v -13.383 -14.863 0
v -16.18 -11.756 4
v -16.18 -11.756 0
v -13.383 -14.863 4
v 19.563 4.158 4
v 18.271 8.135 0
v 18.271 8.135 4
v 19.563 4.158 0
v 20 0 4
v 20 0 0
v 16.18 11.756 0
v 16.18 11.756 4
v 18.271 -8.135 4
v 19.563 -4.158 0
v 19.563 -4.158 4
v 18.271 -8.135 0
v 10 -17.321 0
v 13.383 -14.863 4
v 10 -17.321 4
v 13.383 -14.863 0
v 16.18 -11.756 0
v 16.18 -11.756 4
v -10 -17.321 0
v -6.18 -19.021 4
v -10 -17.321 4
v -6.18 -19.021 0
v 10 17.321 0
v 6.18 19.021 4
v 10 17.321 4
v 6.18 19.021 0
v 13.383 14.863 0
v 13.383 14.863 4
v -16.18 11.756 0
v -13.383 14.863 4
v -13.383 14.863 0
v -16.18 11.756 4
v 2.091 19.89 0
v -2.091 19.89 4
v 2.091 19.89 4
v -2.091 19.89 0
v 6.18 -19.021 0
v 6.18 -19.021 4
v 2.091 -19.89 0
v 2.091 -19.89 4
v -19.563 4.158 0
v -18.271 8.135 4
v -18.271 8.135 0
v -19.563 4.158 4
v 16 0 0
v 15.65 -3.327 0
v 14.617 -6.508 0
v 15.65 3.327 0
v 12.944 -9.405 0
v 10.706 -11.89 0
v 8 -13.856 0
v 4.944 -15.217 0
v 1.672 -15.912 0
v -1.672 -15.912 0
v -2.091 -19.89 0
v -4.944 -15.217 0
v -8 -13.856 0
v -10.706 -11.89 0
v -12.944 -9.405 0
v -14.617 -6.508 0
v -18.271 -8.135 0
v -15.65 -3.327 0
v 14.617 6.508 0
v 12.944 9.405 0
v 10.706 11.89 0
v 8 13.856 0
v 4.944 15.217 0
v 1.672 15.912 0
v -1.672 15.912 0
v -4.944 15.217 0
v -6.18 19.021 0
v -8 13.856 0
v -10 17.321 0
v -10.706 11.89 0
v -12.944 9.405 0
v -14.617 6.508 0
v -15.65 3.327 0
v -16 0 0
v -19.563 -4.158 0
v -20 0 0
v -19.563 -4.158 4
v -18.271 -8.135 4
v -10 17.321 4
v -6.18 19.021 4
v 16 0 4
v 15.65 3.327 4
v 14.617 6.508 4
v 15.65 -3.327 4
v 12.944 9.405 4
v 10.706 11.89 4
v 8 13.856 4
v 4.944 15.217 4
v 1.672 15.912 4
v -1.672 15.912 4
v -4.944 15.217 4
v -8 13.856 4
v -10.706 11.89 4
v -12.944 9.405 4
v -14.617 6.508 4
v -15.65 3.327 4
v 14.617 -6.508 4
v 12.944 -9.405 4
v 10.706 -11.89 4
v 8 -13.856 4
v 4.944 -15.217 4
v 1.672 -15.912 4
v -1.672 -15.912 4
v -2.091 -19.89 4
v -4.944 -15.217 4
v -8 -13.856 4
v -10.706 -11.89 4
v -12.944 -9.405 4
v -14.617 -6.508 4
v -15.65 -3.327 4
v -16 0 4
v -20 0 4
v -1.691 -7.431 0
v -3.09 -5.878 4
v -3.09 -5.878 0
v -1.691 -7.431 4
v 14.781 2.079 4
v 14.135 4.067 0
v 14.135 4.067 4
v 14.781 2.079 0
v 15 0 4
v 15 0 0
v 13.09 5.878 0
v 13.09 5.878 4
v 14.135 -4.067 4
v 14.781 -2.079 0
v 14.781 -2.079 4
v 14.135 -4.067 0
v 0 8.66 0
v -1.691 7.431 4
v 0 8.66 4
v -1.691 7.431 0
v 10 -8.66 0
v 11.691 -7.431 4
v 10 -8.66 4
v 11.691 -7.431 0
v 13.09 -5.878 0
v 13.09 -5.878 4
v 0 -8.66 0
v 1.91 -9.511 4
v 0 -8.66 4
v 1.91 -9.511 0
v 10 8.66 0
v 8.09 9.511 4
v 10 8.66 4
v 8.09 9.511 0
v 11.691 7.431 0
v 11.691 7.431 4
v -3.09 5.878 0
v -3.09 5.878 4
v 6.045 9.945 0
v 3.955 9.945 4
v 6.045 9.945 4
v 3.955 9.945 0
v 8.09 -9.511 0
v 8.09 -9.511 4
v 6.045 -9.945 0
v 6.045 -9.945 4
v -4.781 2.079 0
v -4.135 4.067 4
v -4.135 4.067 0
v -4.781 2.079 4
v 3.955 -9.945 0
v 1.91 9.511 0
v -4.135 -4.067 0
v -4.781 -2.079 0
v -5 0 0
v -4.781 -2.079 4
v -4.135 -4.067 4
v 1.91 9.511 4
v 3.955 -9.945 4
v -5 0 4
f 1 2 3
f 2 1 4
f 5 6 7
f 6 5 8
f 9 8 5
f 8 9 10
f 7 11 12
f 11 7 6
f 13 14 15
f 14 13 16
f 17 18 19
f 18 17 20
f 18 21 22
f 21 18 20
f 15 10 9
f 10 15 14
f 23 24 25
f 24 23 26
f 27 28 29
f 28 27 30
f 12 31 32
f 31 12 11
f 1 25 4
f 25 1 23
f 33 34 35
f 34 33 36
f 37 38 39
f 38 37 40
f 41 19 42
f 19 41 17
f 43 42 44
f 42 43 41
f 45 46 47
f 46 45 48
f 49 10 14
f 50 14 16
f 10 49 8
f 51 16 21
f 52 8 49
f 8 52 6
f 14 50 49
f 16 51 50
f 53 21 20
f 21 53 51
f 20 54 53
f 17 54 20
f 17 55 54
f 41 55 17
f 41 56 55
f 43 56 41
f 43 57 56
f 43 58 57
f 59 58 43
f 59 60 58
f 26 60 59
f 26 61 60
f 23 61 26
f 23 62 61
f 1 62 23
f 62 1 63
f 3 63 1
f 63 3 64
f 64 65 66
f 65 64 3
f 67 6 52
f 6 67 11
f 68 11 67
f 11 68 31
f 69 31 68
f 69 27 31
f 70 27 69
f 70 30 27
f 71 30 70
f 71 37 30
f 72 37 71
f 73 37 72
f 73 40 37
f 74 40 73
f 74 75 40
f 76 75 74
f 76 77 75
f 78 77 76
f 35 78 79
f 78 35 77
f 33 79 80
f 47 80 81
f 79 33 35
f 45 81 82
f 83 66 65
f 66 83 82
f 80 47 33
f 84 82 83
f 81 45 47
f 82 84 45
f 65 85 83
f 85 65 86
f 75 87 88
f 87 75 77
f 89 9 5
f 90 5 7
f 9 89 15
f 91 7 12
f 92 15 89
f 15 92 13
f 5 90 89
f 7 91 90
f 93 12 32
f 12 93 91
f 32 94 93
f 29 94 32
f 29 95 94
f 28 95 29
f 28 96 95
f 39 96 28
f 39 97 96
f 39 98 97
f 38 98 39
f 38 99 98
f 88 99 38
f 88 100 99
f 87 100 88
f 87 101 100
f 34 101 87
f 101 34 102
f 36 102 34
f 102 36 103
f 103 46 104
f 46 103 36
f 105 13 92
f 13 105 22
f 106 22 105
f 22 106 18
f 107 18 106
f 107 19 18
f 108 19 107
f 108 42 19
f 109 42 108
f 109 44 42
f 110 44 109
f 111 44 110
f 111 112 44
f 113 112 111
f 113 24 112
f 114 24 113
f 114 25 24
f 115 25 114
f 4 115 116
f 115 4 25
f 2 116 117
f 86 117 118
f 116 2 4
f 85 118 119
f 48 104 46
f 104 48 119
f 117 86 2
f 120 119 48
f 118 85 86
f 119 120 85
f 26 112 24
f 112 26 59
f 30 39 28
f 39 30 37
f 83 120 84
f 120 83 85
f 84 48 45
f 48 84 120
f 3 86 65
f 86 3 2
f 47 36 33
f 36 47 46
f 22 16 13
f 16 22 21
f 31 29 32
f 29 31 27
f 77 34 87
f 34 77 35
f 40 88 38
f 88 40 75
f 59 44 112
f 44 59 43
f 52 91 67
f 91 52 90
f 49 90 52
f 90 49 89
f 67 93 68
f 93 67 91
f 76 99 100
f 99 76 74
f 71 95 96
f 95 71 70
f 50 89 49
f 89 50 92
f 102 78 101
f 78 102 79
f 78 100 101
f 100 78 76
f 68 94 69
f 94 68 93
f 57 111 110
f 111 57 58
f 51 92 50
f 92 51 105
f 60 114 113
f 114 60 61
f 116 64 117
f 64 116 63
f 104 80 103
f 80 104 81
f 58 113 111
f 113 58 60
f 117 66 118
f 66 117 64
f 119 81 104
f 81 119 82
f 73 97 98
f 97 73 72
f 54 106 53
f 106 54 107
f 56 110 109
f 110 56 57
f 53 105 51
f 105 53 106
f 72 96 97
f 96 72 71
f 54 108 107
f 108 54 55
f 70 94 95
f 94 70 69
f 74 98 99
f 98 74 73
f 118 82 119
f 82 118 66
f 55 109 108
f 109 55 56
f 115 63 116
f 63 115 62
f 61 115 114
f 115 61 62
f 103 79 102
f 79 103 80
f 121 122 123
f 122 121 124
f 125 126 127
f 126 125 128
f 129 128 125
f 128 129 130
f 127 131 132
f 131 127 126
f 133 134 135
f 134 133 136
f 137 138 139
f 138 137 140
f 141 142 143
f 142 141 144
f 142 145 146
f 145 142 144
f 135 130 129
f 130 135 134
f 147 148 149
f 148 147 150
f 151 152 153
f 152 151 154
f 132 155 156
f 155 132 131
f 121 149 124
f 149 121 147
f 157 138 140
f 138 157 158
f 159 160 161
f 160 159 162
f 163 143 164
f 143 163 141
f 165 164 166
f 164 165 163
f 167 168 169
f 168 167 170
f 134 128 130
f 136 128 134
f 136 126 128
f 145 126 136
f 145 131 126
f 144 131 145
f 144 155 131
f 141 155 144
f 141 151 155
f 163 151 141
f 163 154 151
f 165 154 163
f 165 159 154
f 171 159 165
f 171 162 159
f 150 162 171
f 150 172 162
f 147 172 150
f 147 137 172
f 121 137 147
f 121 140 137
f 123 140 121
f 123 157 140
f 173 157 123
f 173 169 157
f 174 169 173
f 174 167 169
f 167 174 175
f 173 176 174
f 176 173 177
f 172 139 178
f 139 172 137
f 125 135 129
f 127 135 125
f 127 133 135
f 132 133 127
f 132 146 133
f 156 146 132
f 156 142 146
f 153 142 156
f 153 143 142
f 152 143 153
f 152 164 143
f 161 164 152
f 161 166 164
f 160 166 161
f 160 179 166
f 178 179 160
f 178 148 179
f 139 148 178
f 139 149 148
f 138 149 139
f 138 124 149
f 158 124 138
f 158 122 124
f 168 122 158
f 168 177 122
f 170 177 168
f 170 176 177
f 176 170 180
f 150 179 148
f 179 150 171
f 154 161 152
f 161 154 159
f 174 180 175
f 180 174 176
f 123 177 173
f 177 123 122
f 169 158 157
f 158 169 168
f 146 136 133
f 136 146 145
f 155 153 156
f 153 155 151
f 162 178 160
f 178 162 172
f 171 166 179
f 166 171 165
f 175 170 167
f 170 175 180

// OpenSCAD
difference() {
	cylinder(r=20, h=4);
	cylinder(r=16, h=4);
}
translate([5, 0, 0]) {
	cylinder(r=10, h=4);
}
